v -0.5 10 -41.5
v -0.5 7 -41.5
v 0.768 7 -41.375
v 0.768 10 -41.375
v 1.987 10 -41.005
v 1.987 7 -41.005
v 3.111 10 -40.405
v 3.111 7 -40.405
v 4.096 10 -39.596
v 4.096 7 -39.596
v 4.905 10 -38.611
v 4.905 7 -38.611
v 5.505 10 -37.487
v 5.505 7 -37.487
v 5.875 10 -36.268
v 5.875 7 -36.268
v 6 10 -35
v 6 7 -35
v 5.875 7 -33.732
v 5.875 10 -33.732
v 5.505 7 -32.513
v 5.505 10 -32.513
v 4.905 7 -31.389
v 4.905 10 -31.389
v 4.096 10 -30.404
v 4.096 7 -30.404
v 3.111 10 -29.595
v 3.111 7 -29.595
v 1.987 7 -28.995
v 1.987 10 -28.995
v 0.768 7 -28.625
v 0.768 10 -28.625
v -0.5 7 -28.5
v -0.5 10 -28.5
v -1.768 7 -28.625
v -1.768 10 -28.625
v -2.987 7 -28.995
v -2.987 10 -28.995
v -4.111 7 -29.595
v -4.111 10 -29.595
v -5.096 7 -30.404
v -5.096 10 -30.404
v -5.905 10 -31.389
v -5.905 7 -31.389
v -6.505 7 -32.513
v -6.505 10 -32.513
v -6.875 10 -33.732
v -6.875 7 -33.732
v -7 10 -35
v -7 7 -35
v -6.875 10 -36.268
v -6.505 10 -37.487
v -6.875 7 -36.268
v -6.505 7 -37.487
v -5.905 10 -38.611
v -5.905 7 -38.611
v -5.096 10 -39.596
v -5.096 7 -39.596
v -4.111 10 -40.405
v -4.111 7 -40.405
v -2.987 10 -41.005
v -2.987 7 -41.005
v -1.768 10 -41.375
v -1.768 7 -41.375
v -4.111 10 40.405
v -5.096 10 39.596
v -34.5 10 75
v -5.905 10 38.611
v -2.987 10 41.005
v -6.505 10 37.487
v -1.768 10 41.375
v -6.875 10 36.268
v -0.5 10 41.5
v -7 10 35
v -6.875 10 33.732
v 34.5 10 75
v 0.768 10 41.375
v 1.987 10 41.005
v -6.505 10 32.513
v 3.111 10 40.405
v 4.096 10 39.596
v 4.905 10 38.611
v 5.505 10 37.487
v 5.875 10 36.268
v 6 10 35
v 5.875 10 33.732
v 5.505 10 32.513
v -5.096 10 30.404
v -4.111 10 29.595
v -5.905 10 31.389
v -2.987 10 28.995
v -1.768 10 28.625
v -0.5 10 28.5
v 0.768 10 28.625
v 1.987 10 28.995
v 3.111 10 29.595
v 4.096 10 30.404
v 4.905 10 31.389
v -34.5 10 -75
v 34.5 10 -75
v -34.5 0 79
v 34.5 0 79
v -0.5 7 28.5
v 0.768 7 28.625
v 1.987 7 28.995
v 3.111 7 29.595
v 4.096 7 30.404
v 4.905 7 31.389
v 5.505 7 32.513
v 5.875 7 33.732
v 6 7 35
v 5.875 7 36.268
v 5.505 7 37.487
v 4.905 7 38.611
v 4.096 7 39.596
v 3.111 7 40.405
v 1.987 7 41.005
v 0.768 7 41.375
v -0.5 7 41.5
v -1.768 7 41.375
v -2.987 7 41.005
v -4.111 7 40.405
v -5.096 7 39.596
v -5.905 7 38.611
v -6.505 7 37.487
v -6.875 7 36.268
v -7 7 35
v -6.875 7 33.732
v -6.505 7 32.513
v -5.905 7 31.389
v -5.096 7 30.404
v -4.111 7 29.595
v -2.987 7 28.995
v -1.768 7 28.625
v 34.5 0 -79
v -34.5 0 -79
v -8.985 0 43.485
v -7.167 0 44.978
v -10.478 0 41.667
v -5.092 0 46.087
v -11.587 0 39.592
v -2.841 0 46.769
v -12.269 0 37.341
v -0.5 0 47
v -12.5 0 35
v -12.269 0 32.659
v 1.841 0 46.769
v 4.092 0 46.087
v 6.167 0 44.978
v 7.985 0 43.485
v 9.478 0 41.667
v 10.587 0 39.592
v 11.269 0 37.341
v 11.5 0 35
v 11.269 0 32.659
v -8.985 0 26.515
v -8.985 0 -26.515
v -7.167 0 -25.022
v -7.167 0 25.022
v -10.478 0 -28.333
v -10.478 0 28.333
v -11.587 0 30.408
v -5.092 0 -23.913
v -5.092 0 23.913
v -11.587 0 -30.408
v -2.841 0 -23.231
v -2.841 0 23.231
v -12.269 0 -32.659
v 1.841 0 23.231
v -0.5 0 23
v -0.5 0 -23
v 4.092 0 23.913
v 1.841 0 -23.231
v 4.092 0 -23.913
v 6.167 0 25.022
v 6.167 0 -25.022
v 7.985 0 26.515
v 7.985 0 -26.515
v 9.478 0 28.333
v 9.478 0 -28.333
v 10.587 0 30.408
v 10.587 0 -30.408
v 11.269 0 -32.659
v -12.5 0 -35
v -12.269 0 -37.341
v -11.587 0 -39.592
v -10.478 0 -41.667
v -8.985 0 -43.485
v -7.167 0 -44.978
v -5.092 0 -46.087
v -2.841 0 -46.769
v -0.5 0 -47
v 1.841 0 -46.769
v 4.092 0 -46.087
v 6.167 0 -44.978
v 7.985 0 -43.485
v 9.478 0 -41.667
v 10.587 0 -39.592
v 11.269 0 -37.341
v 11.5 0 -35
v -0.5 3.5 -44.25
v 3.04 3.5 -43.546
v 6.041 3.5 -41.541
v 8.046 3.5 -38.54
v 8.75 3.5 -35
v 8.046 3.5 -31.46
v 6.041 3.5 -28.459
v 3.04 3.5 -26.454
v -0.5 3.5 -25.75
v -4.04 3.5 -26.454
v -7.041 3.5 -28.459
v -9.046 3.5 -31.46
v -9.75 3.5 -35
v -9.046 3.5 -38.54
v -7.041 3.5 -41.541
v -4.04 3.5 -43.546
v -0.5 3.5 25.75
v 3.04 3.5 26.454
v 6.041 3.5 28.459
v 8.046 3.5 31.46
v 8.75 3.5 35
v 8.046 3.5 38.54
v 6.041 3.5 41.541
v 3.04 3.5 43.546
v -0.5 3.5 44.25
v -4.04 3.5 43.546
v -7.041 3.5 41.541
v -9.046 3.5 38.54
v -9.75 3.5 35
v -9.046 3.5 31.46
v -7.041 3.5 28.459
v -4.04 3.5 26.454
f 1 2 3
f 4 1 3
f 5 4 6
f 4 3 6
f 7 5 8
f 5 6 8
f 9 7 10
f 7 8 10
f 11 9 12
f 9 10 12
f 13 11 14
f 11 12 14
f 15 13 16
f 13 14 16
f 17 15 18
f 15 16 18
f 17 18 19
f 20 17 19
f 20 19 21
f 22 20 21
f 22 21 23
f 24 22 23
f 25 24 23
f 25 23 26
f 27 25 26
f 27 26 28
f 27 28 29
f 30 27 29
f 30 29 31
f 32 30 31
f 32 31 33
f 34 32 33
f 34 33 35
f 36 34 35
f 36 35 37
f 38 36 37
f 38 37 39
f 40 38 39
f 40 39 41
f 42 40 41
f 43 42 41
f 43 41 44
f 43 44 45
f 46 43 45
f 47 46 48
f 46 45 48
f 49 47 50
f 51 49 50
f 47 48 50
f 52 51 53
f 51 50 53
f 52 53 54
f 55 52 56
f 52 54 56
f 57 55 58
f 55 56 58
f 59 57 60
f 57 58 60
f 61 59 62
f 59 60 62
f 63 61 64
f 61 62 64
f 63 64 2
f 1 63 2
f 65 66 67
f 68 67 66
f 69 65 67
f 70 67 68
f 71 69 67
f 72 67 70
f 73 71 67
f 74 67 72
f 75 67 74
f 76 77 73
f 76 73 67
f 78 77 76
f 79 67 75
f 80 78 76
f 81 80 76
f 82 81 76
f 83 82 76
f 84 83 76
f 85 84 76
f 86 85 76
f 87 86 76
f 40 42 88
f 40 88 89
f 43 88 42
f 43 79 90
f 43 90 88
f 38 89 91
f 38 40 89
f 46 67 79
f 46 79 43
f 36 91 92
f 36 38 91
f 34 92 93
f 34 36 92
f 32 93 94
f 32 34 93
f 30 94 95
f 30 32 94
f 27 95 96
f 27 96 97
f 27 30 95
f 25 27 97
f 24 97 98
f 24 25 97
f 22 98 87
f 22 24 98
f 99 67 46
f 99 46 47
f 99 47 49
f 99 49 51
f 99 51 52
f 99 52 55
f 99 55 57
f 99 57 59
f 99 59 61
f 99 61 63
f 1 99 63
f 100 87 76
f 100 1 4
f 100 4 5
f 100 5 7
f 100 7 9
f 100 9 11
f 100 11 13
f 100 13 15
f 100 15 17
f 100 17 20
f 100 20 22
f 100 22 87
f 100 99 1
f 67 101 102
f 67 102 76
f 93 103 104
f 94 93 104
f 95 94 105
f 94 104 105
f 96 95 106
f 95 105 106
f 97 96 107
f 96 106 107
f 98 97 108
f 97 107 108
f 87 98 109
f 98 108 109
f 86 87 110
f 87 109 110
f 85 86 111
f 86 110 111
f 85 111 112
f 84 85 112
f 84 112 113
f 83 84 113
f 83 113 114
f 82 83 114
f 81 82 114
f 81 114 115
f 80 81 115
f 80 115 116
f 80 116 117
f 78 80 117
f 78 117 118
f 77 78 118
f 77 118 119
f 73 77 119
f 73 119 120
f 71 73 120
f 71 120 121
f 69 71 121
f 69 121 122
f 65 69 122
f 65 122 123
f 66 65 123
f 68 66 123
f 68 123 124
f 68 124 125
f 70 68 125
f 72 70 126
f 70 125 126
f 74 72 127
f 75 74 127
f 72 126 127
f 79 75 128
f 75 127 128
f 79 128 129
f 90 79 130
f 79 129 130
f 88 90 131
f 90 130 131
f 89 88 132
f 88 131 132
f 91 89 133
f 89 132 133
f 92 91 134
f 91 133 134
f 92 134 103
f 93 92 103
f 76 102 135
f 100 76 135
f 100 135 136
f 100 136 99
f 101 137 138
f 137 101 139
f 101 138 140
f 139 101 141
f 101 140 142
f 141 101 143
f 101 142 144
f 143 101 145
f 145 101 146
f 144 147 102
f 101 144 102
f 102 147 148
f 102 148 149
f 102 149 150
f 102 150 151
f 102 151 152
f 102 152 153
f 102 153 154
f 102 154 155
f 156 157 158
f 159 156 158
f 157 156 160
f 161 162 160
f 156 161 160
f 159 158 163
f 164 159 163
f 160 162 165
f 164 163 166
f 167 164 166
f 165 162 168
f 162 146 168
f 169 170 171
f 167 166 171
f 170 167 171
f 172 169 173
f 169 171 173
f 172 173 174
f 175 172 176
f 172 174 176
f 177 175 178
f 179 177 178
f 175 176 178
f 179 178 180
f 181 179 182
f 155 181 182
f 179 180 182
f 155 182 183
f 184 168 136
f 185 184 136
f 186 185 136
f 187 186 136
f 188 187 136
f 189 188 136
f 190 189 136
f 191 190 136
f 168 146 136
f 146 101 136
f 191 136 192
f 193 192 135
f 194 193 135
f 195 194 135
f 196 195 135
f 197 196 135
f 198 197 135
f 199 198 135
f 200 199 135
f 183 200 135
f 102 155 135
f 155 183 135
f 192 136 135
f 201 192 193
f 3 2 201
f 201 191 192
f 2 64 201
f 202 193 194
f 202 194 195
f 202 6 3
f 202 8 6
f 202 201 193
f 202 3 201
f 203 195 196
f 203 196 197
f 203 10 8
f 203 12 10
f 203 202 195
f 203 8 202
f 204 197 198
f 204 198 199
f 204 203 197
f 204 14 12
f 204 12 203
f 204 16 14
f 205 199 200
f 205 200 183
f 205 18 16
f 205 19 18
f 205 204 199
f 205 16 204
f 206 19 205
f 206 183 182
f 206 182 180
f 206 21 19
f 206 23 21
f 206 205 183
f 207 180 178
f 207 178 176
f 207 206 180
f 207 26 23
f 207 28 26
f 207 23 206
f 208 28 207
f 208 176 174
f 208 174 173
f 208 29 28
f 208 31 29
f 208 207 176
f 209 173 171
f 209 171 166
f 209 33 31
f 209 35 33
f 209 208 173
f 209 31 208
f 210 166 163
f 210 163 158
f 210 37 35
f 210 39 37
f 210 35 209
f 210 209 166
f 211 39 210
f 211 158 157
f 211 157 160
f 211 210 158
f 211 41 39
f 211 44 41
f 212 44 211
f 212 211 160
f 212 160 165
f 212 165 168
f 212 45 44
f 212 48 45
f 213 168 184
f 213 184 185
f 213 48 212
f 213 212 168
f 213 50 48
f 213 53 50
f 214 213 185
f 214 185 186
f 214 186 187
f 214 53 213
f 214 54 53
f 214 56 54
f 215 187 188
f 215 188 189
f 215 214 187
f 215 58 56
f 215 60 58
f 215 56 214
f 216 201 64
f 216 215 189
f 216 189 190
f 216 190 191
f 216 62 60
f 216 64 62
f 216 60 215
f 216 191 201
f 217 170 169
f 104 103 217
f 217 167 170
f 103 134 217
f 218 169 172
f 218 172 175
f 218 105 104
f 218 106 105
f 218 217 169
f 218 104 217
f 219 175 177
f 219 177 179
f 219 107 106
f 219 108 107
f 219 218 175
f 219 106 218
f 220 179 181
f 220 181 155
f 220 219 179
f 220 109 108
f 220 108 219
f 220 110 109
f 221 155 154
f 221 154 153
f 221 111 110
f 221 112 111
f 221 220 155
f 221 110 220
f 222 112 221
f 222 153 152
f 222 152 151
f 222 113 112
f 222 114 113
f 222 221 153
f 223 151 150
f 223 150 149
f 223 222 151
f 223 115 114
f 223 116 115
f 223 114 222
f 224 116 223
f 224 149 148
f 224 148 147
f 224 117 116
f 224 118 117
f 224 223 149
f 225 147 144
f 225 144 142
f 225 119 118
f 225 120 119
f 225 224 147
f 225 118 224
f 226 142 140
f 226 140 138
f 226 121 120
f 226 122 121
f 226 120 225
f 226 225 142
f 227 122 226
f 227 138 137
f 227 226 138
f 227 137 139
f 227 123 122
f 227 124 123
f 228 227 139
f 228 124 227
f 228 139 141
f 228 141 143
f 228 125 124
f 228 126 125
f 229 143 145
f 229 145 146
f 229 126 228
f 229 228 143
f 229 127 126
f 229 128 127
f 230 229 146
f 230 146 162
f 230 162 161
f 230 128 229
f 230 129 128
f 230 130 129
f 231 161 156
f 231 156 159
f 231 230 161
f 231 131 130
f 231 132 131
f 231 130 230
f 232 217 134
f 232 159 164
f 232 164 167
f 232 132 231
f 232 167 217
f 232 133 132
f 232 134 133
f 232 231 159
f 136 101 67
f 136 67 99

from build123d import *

# Parameters (mm, degrees)
SKETCH_1_W                          = 69
SKETCH_1_H                          = 158
EXTRUDE_1_DEPTH                     = 10
CUT_EXTRUDE_2_REACH                 = 88.783
SKETCH_4_R                          = 6.5
CHAMFER_1_SIZE                      = 5.5
CHAMFER_1_SIZE2                     = 7
PATTERN_LINEAR_2_COUNT              = 2
PATTERN_LINEAR_2_PITCH              = 70
CHAMFER_1_OF_PATTERN_LINEAR_2_SIZE2 = 7
CHAMFER_1_OF_PATTERN_LINEAR_2_SIZE  = 5.5
CUT_EXTRUDE_3_REACH                 = 107.366


with BuildPart() as part:
    # 草图1 → 凸台-拉伸1 (new body)
    with BuildSketch(Plane(origin=(0, 0, 0), x_dir=(1, 0, 0), z_dir=(0, 1, 0))):
        Rectangle(SKETCH_1_W, SKETCH_1_H)
    extrude(amount=EXTRUDE_1_DEPTH)

    # 草图4 → 切除-拉伸2 (cut, up to next)
    with BuildSketch(Plane.XZ, mode=Mode.PRIVATE) as cut_extrude_2_sk1:
        with Locations(Location((-0.5, 35, 0), (0, 0, 270))):
            Circle(SKETCH_4_R)
    cut_extrude_2_tool1 = extrude(cut_extrude_2_sk1.sketch, amount=-CUT_EXTRUDE_2_REACH, mode=Mode.PRIVATE) & part.part
    cut_extrude_2 = cut_extrude_2_tool1.solids().sort_by_distance((-0.5, 0, 35))[0]
    add(cut_extrude_2, mode=Mode.SUBTRACT)

    # 倒角1
    chamfer_1_edges = [part.edges().sort_by_distance(p)[0] for p in [
        (-0.5, 0, 41.5),
    ]]
    chamfer_1_side = [part.faces().sort_by_distance(p)[0] for p in [
        (0.006162549, 0, -0.431378462),
    ]]
    chamfer(chamfer_1_edges, length=CHAMFER_1_SIZE, length2=CHAMFER_1_SIZE2, reference=chamfer_1_side[0])

    # 阵列(线性)2: 切除-拉伸2 ×2
    with Locations(*[(0, 0, -i * PATTERN_LINEAR_2_PITCH) for i in range(1, PATTERN_LINEAR_2_COUNT)]):
        add(cut_extrude_2, mode=Mode.SUBTRACT)

    # 倒角1 of 阵列(线性)2
    chamfer_1_of_pattern_linear_2_edges = [part.edges().sort_by_distance(p)[0] for p in [
        (-0.5, 0, -28.5),
    ]]
    chamfer(chamfer_1_of_pattern_linear_2_edges, length=CHAMFER_1_OF_PATTERN_LINEAR_2_SIZE, length2=CHAMFER_1_OF_PATTERN_LINEAR_2_SIZE2)

    # 草图6 → 切除-拉伸3 (cut, up to next)
    with BuildSketch(Plane(origin=(34.5, 0, 0), x_dir=(0, 0, -1), z_dir=(1, 0, 0)), mode=Mode.PRIVATE) as cut_extrude_3_sk1:
        Polygon((-79, 0), (-75.000285359, 10), (-79, 10), align=None)
    cut_extrude_3_tool1 = extrude(cut_extrude_3_sk1.sketch, amount=-CUT_EXTRUDE_3_REACH, mode=Mode.PRIVATE) & part.part
    # 草图6 → 切除-拉伸3 (cut, up to next)
    with BuildSketch(Plane(origin=(34.5, 0, 0), x_dir=(0, 0, -1), z_dir=(1, 0, 0)), mode=Mode.PRIVATE) as cut_extrude_3_sk2:
        Polygon((79, 10), (79, 0), (75.000285359, 10), align=None)
    cut_extrude_3_tool2 = extrude(cut_extrude_3_sk2.sketch, amount=-CUT_EXTRUDE_3_REACH, mode=Mode.PRIVATE) & part.part
    add(cut_extrude_3_tool1.solids().sort_by_distance((34.5, 6.666667, 77.666762))[0], mode=Mode.SUBTRACT)
    add(cut_extrude_3_tool2.solids().sort_by_distance((34.5, 6.666667, -77.666762))[0], mode=Mode.SUBTRACT)


solid = part.part
